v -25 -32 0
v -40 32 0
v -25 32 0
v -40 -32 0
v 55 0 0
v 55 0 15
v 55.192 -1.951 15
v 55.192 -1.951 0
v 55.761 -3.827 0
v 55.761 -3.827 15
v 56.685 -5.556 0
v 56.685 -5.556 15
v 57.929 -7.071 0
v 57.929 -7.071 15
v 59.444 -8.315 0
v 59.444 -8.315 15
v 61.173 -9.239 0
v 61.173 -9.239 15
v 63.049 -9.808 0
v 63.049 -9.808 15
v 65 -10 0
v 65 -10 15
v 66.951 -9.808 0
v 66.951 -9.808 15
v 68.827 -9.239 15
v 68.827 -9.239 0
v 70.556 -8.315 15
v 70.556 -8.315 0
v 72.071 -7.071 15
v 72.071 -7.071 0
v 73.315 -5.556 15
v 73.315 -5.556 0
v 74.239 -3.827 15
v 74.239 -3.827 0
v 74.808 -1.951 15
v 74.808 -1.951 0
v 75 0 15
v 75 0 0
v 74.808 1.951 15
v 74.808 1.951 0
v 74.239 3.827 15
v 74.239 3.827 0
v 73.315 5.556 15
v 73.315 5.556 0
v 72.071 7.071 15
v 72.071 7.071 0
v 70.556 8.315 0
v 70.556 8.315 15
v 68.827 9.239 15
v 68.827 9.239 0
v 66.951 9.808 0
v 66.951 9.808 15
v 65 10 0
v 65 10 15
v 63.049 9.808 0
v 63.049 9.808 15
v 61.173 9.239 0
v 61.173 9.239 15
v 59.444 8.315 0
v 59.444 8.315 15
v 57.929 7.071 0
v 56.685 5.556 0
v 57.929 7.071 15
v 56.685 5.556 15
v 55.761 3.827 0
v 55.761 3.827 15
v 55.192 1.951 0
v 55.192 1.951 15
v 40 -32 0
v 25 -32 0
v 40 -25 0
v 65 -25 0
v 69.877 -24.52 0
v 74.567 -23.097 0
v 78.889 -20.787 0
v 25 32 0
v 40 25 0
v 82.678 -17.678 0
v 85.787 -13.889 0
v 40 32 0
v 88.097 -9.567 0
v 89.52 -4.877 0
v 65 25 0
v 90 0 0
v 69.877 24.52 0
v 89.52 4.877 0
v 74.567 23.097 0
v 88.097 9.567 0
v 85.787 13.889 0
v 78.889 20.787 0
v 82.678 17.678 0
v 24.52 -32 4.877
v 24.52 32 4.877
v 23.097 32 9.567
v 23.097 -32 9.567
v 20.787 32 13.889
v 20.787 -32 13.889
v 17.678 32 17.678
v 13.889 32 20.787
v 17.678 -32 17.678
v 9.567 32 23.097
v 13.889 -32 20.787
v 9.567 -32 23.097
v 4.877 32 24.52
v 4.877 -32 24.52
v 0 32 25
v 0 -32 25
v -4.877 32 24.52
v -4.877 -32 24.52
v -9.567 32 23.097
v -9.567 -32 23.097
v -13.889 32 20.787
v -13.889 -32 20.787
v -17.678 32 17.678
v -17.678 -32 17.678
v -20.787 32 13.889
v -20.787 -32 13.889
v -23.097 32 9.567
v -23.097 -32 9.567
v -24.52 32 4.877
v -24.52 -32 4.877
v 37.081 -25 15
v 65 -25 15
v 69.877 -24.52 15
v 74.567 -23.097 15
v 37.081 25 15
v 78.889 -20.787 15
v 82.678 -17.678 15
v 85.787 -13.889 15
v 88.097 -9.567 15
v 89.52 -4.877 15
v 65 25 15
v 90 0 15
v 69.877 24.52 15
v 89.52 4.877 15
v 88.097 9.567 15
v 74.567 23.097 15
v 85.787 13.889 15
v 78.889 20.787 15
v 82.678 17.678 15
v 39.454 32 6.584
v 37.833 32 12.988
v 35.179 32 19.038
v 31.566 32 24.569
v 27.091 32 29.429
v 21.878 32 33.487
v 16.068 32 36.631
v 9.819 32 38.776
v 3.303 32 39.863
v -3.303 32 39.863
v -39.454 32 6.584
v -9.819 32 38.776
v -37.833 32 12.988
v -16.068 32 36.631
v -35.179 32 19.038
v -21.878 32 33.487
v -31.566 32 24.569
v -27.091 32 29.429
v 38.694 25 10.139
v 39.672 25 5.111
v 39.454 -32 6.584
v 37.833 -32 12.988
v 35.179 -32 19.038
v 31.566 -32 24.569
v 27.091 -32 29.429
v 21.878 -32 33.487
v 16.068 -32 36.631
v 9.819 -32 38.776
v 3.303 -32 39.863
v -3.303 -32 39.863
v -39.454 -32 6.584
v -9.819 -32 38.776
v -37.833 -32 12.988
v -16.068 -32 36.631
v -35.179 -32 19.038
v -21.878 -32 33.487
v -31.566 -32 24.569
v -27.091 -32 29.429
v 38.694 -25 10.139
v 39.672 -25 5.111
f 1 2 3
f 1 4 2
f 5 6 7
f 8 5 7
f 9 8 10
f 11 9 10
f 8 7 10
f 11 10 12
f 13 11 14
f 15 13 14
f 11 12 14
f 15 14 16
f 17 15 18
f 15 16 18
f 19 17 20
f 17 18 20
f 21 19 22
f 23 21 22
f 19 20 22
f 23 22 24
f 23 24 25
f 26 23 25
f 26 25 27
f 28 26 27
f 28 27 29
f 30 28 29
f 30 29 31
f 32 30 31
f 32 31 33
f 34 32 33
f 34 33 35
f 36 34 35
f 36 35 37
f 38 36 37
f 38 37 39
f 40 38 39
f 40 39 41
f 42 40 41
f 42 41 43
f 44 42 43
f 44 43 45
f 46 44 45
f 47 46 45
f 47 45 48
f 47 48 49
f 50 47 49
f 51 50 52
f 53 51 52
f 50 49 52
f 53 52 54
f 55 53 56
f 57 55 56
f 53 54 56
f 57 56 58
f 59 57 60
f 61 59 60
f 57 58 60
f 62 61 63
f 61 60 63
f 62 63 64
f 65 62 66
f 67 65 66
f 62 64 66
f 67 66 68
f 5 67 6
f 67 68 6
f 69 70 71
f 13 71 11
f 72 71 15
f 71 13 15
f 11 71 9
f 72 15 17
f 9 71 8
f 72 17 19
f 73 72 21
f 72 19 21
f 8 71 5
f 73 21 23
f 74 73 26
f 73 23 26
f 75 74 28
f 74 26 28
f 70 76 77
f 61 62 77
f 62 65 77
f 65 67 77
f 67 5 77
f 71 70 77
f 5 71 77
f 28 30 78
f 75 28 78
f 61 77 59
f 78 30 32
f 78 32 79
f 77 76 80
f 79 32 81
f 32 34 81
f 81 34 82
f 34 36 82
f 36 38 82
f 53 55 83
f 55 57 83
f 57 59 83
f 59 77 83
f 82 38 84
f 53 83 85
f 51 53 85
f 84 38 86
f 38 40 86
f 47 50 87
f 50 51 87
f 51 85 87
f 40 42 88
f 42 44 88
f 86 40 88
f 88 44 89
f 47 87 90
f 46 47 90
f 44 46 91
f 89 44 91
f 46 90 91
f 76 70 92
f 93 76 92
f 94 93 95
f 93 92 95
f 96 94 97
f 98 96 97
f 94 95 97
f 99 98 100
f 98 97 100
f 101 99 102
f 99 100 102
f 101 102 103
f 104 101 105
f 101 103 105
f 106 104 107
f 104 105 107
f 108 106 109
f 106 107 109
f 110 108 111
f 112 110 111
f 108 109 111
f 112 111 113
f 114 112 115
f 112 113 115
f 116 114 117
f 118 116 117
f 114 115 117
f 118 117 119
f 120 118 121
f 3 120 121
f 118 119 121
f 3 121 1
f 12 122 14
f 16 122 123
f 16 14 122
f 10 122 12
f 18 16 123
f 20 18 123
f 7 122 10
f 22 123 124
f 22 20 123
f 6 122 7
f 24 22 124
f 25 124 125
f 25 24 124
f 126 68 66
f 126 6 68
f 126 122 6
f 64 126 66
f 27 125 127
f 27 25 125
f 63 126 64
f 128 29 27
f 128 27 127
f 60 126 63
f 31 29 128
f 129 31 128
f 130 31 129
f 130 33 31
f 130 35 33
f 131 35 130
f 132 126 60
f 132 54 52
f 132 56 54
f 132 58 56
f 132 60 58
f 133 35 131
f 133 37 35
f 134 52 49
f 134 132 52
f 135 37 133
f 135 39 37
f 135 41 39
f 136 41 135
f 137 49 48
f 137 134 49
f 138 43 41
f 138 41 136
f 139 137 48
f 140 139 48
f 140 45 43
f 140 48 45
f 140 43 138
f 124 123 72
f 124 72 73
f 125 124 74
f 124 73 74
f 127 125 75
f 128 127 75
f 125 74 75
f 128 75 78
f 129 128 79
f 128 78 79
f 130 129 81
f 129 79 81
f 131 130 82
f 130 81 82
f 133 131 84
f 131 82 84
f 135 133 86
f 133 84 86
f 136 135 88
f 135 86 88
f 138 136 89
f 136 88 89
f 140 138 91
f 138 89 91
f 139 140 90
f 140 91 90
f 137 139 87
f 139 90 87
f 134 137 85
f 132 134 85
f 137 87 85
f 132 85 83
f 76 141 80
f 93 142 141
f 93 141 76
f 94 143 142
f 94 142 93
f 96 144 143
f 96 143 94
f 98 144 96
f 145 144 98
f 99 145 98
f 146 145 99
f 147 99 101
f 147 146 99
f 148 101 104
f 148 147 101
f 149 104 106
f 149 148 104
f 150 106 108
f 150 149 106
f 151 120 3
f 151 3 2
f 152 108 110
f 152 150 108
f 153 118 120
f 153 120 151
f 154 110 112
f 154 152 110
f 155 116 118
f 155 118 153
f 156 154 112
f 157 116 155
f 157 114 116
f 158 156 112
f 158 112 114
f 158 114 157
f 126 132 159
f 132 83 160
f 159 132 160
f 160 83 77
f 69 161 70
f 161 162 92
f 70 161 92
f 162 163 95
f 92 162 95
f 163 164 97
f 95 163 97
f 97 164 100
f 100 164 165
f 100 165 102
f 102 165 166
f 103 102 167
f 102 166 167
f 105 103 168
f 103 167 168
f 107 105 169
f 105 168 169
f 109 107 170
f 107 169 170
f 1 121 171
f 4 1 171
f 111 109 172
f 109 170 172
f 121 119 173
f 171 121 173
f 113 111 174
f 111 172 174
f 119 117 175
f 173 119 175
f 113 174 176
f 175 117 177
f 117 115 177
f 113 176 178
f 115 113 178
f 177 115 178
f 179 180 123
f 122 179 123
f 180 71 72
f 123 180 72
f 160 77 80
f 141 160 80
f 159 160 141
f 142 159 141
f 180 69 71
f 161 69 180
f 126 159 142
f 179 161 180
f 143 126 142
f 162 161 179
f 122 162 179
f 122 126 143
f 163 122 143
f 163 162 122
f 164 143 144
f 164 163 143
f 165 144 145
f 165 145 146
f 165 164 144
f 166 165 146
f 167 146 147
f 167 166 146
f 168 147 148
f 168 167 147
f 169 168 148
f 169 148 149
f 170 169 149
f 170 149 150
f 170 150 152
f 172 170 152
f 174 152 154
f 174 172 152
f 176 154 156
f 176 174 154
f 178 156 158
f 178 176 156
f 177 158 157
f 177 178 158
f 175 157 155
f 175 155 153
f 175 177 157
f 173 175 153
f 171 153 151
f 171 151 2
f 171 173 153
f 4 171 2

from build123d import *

# Parameters (mm, degrees)
PAD_DEPTH    = 32
PAD001_DEPTH = 15
SKETCH002_R  = 10
POCKET_DEPTH = 15.001


with BuildPart() as part:
    # Sketch → Pad (new body, symmetric)
    with BuildSketch(Plane.XZ):
        with BuildLine():
            ThreePointArc((25, 0), (0, 25), (-25, 0))
            Line((-40, 0), (-25, 0))
            ThreePointArc((40, 0), (0, 40), (-40, 0))
            Line((25, 0), (40, 0))
        make_face()
    extrude(amount=PAD_DEPTH, both=True)

    # Sketch001 → Pad001 (join)
    with BuildSketch(Plane.XY):
        with BuildLine():
            Line((65, 25), (25, 25))
            Line((25, 25), (25, -25))
            Line((25, -25), (65, -25))
            ThreePointArc((65, -25), (90, 0), (65, 25))
        make_face()
    extrude(amount=PAD001_DEPTH)

    # Sketch002 (on Face10 of Pad001) → Pocket (cut, through all)
    with BuildSketch(Plane(origin=(0, 0, 15), x_dir=(-1, 0, 0), z_dir=(0, 0, 1))):
        with Locations((-65, 0)):
            Circle(SKETCH002_R)
    extrude(amount=-POCKET_DEPTH, mode=Mode.SUBTRACT)


solid = part.part
